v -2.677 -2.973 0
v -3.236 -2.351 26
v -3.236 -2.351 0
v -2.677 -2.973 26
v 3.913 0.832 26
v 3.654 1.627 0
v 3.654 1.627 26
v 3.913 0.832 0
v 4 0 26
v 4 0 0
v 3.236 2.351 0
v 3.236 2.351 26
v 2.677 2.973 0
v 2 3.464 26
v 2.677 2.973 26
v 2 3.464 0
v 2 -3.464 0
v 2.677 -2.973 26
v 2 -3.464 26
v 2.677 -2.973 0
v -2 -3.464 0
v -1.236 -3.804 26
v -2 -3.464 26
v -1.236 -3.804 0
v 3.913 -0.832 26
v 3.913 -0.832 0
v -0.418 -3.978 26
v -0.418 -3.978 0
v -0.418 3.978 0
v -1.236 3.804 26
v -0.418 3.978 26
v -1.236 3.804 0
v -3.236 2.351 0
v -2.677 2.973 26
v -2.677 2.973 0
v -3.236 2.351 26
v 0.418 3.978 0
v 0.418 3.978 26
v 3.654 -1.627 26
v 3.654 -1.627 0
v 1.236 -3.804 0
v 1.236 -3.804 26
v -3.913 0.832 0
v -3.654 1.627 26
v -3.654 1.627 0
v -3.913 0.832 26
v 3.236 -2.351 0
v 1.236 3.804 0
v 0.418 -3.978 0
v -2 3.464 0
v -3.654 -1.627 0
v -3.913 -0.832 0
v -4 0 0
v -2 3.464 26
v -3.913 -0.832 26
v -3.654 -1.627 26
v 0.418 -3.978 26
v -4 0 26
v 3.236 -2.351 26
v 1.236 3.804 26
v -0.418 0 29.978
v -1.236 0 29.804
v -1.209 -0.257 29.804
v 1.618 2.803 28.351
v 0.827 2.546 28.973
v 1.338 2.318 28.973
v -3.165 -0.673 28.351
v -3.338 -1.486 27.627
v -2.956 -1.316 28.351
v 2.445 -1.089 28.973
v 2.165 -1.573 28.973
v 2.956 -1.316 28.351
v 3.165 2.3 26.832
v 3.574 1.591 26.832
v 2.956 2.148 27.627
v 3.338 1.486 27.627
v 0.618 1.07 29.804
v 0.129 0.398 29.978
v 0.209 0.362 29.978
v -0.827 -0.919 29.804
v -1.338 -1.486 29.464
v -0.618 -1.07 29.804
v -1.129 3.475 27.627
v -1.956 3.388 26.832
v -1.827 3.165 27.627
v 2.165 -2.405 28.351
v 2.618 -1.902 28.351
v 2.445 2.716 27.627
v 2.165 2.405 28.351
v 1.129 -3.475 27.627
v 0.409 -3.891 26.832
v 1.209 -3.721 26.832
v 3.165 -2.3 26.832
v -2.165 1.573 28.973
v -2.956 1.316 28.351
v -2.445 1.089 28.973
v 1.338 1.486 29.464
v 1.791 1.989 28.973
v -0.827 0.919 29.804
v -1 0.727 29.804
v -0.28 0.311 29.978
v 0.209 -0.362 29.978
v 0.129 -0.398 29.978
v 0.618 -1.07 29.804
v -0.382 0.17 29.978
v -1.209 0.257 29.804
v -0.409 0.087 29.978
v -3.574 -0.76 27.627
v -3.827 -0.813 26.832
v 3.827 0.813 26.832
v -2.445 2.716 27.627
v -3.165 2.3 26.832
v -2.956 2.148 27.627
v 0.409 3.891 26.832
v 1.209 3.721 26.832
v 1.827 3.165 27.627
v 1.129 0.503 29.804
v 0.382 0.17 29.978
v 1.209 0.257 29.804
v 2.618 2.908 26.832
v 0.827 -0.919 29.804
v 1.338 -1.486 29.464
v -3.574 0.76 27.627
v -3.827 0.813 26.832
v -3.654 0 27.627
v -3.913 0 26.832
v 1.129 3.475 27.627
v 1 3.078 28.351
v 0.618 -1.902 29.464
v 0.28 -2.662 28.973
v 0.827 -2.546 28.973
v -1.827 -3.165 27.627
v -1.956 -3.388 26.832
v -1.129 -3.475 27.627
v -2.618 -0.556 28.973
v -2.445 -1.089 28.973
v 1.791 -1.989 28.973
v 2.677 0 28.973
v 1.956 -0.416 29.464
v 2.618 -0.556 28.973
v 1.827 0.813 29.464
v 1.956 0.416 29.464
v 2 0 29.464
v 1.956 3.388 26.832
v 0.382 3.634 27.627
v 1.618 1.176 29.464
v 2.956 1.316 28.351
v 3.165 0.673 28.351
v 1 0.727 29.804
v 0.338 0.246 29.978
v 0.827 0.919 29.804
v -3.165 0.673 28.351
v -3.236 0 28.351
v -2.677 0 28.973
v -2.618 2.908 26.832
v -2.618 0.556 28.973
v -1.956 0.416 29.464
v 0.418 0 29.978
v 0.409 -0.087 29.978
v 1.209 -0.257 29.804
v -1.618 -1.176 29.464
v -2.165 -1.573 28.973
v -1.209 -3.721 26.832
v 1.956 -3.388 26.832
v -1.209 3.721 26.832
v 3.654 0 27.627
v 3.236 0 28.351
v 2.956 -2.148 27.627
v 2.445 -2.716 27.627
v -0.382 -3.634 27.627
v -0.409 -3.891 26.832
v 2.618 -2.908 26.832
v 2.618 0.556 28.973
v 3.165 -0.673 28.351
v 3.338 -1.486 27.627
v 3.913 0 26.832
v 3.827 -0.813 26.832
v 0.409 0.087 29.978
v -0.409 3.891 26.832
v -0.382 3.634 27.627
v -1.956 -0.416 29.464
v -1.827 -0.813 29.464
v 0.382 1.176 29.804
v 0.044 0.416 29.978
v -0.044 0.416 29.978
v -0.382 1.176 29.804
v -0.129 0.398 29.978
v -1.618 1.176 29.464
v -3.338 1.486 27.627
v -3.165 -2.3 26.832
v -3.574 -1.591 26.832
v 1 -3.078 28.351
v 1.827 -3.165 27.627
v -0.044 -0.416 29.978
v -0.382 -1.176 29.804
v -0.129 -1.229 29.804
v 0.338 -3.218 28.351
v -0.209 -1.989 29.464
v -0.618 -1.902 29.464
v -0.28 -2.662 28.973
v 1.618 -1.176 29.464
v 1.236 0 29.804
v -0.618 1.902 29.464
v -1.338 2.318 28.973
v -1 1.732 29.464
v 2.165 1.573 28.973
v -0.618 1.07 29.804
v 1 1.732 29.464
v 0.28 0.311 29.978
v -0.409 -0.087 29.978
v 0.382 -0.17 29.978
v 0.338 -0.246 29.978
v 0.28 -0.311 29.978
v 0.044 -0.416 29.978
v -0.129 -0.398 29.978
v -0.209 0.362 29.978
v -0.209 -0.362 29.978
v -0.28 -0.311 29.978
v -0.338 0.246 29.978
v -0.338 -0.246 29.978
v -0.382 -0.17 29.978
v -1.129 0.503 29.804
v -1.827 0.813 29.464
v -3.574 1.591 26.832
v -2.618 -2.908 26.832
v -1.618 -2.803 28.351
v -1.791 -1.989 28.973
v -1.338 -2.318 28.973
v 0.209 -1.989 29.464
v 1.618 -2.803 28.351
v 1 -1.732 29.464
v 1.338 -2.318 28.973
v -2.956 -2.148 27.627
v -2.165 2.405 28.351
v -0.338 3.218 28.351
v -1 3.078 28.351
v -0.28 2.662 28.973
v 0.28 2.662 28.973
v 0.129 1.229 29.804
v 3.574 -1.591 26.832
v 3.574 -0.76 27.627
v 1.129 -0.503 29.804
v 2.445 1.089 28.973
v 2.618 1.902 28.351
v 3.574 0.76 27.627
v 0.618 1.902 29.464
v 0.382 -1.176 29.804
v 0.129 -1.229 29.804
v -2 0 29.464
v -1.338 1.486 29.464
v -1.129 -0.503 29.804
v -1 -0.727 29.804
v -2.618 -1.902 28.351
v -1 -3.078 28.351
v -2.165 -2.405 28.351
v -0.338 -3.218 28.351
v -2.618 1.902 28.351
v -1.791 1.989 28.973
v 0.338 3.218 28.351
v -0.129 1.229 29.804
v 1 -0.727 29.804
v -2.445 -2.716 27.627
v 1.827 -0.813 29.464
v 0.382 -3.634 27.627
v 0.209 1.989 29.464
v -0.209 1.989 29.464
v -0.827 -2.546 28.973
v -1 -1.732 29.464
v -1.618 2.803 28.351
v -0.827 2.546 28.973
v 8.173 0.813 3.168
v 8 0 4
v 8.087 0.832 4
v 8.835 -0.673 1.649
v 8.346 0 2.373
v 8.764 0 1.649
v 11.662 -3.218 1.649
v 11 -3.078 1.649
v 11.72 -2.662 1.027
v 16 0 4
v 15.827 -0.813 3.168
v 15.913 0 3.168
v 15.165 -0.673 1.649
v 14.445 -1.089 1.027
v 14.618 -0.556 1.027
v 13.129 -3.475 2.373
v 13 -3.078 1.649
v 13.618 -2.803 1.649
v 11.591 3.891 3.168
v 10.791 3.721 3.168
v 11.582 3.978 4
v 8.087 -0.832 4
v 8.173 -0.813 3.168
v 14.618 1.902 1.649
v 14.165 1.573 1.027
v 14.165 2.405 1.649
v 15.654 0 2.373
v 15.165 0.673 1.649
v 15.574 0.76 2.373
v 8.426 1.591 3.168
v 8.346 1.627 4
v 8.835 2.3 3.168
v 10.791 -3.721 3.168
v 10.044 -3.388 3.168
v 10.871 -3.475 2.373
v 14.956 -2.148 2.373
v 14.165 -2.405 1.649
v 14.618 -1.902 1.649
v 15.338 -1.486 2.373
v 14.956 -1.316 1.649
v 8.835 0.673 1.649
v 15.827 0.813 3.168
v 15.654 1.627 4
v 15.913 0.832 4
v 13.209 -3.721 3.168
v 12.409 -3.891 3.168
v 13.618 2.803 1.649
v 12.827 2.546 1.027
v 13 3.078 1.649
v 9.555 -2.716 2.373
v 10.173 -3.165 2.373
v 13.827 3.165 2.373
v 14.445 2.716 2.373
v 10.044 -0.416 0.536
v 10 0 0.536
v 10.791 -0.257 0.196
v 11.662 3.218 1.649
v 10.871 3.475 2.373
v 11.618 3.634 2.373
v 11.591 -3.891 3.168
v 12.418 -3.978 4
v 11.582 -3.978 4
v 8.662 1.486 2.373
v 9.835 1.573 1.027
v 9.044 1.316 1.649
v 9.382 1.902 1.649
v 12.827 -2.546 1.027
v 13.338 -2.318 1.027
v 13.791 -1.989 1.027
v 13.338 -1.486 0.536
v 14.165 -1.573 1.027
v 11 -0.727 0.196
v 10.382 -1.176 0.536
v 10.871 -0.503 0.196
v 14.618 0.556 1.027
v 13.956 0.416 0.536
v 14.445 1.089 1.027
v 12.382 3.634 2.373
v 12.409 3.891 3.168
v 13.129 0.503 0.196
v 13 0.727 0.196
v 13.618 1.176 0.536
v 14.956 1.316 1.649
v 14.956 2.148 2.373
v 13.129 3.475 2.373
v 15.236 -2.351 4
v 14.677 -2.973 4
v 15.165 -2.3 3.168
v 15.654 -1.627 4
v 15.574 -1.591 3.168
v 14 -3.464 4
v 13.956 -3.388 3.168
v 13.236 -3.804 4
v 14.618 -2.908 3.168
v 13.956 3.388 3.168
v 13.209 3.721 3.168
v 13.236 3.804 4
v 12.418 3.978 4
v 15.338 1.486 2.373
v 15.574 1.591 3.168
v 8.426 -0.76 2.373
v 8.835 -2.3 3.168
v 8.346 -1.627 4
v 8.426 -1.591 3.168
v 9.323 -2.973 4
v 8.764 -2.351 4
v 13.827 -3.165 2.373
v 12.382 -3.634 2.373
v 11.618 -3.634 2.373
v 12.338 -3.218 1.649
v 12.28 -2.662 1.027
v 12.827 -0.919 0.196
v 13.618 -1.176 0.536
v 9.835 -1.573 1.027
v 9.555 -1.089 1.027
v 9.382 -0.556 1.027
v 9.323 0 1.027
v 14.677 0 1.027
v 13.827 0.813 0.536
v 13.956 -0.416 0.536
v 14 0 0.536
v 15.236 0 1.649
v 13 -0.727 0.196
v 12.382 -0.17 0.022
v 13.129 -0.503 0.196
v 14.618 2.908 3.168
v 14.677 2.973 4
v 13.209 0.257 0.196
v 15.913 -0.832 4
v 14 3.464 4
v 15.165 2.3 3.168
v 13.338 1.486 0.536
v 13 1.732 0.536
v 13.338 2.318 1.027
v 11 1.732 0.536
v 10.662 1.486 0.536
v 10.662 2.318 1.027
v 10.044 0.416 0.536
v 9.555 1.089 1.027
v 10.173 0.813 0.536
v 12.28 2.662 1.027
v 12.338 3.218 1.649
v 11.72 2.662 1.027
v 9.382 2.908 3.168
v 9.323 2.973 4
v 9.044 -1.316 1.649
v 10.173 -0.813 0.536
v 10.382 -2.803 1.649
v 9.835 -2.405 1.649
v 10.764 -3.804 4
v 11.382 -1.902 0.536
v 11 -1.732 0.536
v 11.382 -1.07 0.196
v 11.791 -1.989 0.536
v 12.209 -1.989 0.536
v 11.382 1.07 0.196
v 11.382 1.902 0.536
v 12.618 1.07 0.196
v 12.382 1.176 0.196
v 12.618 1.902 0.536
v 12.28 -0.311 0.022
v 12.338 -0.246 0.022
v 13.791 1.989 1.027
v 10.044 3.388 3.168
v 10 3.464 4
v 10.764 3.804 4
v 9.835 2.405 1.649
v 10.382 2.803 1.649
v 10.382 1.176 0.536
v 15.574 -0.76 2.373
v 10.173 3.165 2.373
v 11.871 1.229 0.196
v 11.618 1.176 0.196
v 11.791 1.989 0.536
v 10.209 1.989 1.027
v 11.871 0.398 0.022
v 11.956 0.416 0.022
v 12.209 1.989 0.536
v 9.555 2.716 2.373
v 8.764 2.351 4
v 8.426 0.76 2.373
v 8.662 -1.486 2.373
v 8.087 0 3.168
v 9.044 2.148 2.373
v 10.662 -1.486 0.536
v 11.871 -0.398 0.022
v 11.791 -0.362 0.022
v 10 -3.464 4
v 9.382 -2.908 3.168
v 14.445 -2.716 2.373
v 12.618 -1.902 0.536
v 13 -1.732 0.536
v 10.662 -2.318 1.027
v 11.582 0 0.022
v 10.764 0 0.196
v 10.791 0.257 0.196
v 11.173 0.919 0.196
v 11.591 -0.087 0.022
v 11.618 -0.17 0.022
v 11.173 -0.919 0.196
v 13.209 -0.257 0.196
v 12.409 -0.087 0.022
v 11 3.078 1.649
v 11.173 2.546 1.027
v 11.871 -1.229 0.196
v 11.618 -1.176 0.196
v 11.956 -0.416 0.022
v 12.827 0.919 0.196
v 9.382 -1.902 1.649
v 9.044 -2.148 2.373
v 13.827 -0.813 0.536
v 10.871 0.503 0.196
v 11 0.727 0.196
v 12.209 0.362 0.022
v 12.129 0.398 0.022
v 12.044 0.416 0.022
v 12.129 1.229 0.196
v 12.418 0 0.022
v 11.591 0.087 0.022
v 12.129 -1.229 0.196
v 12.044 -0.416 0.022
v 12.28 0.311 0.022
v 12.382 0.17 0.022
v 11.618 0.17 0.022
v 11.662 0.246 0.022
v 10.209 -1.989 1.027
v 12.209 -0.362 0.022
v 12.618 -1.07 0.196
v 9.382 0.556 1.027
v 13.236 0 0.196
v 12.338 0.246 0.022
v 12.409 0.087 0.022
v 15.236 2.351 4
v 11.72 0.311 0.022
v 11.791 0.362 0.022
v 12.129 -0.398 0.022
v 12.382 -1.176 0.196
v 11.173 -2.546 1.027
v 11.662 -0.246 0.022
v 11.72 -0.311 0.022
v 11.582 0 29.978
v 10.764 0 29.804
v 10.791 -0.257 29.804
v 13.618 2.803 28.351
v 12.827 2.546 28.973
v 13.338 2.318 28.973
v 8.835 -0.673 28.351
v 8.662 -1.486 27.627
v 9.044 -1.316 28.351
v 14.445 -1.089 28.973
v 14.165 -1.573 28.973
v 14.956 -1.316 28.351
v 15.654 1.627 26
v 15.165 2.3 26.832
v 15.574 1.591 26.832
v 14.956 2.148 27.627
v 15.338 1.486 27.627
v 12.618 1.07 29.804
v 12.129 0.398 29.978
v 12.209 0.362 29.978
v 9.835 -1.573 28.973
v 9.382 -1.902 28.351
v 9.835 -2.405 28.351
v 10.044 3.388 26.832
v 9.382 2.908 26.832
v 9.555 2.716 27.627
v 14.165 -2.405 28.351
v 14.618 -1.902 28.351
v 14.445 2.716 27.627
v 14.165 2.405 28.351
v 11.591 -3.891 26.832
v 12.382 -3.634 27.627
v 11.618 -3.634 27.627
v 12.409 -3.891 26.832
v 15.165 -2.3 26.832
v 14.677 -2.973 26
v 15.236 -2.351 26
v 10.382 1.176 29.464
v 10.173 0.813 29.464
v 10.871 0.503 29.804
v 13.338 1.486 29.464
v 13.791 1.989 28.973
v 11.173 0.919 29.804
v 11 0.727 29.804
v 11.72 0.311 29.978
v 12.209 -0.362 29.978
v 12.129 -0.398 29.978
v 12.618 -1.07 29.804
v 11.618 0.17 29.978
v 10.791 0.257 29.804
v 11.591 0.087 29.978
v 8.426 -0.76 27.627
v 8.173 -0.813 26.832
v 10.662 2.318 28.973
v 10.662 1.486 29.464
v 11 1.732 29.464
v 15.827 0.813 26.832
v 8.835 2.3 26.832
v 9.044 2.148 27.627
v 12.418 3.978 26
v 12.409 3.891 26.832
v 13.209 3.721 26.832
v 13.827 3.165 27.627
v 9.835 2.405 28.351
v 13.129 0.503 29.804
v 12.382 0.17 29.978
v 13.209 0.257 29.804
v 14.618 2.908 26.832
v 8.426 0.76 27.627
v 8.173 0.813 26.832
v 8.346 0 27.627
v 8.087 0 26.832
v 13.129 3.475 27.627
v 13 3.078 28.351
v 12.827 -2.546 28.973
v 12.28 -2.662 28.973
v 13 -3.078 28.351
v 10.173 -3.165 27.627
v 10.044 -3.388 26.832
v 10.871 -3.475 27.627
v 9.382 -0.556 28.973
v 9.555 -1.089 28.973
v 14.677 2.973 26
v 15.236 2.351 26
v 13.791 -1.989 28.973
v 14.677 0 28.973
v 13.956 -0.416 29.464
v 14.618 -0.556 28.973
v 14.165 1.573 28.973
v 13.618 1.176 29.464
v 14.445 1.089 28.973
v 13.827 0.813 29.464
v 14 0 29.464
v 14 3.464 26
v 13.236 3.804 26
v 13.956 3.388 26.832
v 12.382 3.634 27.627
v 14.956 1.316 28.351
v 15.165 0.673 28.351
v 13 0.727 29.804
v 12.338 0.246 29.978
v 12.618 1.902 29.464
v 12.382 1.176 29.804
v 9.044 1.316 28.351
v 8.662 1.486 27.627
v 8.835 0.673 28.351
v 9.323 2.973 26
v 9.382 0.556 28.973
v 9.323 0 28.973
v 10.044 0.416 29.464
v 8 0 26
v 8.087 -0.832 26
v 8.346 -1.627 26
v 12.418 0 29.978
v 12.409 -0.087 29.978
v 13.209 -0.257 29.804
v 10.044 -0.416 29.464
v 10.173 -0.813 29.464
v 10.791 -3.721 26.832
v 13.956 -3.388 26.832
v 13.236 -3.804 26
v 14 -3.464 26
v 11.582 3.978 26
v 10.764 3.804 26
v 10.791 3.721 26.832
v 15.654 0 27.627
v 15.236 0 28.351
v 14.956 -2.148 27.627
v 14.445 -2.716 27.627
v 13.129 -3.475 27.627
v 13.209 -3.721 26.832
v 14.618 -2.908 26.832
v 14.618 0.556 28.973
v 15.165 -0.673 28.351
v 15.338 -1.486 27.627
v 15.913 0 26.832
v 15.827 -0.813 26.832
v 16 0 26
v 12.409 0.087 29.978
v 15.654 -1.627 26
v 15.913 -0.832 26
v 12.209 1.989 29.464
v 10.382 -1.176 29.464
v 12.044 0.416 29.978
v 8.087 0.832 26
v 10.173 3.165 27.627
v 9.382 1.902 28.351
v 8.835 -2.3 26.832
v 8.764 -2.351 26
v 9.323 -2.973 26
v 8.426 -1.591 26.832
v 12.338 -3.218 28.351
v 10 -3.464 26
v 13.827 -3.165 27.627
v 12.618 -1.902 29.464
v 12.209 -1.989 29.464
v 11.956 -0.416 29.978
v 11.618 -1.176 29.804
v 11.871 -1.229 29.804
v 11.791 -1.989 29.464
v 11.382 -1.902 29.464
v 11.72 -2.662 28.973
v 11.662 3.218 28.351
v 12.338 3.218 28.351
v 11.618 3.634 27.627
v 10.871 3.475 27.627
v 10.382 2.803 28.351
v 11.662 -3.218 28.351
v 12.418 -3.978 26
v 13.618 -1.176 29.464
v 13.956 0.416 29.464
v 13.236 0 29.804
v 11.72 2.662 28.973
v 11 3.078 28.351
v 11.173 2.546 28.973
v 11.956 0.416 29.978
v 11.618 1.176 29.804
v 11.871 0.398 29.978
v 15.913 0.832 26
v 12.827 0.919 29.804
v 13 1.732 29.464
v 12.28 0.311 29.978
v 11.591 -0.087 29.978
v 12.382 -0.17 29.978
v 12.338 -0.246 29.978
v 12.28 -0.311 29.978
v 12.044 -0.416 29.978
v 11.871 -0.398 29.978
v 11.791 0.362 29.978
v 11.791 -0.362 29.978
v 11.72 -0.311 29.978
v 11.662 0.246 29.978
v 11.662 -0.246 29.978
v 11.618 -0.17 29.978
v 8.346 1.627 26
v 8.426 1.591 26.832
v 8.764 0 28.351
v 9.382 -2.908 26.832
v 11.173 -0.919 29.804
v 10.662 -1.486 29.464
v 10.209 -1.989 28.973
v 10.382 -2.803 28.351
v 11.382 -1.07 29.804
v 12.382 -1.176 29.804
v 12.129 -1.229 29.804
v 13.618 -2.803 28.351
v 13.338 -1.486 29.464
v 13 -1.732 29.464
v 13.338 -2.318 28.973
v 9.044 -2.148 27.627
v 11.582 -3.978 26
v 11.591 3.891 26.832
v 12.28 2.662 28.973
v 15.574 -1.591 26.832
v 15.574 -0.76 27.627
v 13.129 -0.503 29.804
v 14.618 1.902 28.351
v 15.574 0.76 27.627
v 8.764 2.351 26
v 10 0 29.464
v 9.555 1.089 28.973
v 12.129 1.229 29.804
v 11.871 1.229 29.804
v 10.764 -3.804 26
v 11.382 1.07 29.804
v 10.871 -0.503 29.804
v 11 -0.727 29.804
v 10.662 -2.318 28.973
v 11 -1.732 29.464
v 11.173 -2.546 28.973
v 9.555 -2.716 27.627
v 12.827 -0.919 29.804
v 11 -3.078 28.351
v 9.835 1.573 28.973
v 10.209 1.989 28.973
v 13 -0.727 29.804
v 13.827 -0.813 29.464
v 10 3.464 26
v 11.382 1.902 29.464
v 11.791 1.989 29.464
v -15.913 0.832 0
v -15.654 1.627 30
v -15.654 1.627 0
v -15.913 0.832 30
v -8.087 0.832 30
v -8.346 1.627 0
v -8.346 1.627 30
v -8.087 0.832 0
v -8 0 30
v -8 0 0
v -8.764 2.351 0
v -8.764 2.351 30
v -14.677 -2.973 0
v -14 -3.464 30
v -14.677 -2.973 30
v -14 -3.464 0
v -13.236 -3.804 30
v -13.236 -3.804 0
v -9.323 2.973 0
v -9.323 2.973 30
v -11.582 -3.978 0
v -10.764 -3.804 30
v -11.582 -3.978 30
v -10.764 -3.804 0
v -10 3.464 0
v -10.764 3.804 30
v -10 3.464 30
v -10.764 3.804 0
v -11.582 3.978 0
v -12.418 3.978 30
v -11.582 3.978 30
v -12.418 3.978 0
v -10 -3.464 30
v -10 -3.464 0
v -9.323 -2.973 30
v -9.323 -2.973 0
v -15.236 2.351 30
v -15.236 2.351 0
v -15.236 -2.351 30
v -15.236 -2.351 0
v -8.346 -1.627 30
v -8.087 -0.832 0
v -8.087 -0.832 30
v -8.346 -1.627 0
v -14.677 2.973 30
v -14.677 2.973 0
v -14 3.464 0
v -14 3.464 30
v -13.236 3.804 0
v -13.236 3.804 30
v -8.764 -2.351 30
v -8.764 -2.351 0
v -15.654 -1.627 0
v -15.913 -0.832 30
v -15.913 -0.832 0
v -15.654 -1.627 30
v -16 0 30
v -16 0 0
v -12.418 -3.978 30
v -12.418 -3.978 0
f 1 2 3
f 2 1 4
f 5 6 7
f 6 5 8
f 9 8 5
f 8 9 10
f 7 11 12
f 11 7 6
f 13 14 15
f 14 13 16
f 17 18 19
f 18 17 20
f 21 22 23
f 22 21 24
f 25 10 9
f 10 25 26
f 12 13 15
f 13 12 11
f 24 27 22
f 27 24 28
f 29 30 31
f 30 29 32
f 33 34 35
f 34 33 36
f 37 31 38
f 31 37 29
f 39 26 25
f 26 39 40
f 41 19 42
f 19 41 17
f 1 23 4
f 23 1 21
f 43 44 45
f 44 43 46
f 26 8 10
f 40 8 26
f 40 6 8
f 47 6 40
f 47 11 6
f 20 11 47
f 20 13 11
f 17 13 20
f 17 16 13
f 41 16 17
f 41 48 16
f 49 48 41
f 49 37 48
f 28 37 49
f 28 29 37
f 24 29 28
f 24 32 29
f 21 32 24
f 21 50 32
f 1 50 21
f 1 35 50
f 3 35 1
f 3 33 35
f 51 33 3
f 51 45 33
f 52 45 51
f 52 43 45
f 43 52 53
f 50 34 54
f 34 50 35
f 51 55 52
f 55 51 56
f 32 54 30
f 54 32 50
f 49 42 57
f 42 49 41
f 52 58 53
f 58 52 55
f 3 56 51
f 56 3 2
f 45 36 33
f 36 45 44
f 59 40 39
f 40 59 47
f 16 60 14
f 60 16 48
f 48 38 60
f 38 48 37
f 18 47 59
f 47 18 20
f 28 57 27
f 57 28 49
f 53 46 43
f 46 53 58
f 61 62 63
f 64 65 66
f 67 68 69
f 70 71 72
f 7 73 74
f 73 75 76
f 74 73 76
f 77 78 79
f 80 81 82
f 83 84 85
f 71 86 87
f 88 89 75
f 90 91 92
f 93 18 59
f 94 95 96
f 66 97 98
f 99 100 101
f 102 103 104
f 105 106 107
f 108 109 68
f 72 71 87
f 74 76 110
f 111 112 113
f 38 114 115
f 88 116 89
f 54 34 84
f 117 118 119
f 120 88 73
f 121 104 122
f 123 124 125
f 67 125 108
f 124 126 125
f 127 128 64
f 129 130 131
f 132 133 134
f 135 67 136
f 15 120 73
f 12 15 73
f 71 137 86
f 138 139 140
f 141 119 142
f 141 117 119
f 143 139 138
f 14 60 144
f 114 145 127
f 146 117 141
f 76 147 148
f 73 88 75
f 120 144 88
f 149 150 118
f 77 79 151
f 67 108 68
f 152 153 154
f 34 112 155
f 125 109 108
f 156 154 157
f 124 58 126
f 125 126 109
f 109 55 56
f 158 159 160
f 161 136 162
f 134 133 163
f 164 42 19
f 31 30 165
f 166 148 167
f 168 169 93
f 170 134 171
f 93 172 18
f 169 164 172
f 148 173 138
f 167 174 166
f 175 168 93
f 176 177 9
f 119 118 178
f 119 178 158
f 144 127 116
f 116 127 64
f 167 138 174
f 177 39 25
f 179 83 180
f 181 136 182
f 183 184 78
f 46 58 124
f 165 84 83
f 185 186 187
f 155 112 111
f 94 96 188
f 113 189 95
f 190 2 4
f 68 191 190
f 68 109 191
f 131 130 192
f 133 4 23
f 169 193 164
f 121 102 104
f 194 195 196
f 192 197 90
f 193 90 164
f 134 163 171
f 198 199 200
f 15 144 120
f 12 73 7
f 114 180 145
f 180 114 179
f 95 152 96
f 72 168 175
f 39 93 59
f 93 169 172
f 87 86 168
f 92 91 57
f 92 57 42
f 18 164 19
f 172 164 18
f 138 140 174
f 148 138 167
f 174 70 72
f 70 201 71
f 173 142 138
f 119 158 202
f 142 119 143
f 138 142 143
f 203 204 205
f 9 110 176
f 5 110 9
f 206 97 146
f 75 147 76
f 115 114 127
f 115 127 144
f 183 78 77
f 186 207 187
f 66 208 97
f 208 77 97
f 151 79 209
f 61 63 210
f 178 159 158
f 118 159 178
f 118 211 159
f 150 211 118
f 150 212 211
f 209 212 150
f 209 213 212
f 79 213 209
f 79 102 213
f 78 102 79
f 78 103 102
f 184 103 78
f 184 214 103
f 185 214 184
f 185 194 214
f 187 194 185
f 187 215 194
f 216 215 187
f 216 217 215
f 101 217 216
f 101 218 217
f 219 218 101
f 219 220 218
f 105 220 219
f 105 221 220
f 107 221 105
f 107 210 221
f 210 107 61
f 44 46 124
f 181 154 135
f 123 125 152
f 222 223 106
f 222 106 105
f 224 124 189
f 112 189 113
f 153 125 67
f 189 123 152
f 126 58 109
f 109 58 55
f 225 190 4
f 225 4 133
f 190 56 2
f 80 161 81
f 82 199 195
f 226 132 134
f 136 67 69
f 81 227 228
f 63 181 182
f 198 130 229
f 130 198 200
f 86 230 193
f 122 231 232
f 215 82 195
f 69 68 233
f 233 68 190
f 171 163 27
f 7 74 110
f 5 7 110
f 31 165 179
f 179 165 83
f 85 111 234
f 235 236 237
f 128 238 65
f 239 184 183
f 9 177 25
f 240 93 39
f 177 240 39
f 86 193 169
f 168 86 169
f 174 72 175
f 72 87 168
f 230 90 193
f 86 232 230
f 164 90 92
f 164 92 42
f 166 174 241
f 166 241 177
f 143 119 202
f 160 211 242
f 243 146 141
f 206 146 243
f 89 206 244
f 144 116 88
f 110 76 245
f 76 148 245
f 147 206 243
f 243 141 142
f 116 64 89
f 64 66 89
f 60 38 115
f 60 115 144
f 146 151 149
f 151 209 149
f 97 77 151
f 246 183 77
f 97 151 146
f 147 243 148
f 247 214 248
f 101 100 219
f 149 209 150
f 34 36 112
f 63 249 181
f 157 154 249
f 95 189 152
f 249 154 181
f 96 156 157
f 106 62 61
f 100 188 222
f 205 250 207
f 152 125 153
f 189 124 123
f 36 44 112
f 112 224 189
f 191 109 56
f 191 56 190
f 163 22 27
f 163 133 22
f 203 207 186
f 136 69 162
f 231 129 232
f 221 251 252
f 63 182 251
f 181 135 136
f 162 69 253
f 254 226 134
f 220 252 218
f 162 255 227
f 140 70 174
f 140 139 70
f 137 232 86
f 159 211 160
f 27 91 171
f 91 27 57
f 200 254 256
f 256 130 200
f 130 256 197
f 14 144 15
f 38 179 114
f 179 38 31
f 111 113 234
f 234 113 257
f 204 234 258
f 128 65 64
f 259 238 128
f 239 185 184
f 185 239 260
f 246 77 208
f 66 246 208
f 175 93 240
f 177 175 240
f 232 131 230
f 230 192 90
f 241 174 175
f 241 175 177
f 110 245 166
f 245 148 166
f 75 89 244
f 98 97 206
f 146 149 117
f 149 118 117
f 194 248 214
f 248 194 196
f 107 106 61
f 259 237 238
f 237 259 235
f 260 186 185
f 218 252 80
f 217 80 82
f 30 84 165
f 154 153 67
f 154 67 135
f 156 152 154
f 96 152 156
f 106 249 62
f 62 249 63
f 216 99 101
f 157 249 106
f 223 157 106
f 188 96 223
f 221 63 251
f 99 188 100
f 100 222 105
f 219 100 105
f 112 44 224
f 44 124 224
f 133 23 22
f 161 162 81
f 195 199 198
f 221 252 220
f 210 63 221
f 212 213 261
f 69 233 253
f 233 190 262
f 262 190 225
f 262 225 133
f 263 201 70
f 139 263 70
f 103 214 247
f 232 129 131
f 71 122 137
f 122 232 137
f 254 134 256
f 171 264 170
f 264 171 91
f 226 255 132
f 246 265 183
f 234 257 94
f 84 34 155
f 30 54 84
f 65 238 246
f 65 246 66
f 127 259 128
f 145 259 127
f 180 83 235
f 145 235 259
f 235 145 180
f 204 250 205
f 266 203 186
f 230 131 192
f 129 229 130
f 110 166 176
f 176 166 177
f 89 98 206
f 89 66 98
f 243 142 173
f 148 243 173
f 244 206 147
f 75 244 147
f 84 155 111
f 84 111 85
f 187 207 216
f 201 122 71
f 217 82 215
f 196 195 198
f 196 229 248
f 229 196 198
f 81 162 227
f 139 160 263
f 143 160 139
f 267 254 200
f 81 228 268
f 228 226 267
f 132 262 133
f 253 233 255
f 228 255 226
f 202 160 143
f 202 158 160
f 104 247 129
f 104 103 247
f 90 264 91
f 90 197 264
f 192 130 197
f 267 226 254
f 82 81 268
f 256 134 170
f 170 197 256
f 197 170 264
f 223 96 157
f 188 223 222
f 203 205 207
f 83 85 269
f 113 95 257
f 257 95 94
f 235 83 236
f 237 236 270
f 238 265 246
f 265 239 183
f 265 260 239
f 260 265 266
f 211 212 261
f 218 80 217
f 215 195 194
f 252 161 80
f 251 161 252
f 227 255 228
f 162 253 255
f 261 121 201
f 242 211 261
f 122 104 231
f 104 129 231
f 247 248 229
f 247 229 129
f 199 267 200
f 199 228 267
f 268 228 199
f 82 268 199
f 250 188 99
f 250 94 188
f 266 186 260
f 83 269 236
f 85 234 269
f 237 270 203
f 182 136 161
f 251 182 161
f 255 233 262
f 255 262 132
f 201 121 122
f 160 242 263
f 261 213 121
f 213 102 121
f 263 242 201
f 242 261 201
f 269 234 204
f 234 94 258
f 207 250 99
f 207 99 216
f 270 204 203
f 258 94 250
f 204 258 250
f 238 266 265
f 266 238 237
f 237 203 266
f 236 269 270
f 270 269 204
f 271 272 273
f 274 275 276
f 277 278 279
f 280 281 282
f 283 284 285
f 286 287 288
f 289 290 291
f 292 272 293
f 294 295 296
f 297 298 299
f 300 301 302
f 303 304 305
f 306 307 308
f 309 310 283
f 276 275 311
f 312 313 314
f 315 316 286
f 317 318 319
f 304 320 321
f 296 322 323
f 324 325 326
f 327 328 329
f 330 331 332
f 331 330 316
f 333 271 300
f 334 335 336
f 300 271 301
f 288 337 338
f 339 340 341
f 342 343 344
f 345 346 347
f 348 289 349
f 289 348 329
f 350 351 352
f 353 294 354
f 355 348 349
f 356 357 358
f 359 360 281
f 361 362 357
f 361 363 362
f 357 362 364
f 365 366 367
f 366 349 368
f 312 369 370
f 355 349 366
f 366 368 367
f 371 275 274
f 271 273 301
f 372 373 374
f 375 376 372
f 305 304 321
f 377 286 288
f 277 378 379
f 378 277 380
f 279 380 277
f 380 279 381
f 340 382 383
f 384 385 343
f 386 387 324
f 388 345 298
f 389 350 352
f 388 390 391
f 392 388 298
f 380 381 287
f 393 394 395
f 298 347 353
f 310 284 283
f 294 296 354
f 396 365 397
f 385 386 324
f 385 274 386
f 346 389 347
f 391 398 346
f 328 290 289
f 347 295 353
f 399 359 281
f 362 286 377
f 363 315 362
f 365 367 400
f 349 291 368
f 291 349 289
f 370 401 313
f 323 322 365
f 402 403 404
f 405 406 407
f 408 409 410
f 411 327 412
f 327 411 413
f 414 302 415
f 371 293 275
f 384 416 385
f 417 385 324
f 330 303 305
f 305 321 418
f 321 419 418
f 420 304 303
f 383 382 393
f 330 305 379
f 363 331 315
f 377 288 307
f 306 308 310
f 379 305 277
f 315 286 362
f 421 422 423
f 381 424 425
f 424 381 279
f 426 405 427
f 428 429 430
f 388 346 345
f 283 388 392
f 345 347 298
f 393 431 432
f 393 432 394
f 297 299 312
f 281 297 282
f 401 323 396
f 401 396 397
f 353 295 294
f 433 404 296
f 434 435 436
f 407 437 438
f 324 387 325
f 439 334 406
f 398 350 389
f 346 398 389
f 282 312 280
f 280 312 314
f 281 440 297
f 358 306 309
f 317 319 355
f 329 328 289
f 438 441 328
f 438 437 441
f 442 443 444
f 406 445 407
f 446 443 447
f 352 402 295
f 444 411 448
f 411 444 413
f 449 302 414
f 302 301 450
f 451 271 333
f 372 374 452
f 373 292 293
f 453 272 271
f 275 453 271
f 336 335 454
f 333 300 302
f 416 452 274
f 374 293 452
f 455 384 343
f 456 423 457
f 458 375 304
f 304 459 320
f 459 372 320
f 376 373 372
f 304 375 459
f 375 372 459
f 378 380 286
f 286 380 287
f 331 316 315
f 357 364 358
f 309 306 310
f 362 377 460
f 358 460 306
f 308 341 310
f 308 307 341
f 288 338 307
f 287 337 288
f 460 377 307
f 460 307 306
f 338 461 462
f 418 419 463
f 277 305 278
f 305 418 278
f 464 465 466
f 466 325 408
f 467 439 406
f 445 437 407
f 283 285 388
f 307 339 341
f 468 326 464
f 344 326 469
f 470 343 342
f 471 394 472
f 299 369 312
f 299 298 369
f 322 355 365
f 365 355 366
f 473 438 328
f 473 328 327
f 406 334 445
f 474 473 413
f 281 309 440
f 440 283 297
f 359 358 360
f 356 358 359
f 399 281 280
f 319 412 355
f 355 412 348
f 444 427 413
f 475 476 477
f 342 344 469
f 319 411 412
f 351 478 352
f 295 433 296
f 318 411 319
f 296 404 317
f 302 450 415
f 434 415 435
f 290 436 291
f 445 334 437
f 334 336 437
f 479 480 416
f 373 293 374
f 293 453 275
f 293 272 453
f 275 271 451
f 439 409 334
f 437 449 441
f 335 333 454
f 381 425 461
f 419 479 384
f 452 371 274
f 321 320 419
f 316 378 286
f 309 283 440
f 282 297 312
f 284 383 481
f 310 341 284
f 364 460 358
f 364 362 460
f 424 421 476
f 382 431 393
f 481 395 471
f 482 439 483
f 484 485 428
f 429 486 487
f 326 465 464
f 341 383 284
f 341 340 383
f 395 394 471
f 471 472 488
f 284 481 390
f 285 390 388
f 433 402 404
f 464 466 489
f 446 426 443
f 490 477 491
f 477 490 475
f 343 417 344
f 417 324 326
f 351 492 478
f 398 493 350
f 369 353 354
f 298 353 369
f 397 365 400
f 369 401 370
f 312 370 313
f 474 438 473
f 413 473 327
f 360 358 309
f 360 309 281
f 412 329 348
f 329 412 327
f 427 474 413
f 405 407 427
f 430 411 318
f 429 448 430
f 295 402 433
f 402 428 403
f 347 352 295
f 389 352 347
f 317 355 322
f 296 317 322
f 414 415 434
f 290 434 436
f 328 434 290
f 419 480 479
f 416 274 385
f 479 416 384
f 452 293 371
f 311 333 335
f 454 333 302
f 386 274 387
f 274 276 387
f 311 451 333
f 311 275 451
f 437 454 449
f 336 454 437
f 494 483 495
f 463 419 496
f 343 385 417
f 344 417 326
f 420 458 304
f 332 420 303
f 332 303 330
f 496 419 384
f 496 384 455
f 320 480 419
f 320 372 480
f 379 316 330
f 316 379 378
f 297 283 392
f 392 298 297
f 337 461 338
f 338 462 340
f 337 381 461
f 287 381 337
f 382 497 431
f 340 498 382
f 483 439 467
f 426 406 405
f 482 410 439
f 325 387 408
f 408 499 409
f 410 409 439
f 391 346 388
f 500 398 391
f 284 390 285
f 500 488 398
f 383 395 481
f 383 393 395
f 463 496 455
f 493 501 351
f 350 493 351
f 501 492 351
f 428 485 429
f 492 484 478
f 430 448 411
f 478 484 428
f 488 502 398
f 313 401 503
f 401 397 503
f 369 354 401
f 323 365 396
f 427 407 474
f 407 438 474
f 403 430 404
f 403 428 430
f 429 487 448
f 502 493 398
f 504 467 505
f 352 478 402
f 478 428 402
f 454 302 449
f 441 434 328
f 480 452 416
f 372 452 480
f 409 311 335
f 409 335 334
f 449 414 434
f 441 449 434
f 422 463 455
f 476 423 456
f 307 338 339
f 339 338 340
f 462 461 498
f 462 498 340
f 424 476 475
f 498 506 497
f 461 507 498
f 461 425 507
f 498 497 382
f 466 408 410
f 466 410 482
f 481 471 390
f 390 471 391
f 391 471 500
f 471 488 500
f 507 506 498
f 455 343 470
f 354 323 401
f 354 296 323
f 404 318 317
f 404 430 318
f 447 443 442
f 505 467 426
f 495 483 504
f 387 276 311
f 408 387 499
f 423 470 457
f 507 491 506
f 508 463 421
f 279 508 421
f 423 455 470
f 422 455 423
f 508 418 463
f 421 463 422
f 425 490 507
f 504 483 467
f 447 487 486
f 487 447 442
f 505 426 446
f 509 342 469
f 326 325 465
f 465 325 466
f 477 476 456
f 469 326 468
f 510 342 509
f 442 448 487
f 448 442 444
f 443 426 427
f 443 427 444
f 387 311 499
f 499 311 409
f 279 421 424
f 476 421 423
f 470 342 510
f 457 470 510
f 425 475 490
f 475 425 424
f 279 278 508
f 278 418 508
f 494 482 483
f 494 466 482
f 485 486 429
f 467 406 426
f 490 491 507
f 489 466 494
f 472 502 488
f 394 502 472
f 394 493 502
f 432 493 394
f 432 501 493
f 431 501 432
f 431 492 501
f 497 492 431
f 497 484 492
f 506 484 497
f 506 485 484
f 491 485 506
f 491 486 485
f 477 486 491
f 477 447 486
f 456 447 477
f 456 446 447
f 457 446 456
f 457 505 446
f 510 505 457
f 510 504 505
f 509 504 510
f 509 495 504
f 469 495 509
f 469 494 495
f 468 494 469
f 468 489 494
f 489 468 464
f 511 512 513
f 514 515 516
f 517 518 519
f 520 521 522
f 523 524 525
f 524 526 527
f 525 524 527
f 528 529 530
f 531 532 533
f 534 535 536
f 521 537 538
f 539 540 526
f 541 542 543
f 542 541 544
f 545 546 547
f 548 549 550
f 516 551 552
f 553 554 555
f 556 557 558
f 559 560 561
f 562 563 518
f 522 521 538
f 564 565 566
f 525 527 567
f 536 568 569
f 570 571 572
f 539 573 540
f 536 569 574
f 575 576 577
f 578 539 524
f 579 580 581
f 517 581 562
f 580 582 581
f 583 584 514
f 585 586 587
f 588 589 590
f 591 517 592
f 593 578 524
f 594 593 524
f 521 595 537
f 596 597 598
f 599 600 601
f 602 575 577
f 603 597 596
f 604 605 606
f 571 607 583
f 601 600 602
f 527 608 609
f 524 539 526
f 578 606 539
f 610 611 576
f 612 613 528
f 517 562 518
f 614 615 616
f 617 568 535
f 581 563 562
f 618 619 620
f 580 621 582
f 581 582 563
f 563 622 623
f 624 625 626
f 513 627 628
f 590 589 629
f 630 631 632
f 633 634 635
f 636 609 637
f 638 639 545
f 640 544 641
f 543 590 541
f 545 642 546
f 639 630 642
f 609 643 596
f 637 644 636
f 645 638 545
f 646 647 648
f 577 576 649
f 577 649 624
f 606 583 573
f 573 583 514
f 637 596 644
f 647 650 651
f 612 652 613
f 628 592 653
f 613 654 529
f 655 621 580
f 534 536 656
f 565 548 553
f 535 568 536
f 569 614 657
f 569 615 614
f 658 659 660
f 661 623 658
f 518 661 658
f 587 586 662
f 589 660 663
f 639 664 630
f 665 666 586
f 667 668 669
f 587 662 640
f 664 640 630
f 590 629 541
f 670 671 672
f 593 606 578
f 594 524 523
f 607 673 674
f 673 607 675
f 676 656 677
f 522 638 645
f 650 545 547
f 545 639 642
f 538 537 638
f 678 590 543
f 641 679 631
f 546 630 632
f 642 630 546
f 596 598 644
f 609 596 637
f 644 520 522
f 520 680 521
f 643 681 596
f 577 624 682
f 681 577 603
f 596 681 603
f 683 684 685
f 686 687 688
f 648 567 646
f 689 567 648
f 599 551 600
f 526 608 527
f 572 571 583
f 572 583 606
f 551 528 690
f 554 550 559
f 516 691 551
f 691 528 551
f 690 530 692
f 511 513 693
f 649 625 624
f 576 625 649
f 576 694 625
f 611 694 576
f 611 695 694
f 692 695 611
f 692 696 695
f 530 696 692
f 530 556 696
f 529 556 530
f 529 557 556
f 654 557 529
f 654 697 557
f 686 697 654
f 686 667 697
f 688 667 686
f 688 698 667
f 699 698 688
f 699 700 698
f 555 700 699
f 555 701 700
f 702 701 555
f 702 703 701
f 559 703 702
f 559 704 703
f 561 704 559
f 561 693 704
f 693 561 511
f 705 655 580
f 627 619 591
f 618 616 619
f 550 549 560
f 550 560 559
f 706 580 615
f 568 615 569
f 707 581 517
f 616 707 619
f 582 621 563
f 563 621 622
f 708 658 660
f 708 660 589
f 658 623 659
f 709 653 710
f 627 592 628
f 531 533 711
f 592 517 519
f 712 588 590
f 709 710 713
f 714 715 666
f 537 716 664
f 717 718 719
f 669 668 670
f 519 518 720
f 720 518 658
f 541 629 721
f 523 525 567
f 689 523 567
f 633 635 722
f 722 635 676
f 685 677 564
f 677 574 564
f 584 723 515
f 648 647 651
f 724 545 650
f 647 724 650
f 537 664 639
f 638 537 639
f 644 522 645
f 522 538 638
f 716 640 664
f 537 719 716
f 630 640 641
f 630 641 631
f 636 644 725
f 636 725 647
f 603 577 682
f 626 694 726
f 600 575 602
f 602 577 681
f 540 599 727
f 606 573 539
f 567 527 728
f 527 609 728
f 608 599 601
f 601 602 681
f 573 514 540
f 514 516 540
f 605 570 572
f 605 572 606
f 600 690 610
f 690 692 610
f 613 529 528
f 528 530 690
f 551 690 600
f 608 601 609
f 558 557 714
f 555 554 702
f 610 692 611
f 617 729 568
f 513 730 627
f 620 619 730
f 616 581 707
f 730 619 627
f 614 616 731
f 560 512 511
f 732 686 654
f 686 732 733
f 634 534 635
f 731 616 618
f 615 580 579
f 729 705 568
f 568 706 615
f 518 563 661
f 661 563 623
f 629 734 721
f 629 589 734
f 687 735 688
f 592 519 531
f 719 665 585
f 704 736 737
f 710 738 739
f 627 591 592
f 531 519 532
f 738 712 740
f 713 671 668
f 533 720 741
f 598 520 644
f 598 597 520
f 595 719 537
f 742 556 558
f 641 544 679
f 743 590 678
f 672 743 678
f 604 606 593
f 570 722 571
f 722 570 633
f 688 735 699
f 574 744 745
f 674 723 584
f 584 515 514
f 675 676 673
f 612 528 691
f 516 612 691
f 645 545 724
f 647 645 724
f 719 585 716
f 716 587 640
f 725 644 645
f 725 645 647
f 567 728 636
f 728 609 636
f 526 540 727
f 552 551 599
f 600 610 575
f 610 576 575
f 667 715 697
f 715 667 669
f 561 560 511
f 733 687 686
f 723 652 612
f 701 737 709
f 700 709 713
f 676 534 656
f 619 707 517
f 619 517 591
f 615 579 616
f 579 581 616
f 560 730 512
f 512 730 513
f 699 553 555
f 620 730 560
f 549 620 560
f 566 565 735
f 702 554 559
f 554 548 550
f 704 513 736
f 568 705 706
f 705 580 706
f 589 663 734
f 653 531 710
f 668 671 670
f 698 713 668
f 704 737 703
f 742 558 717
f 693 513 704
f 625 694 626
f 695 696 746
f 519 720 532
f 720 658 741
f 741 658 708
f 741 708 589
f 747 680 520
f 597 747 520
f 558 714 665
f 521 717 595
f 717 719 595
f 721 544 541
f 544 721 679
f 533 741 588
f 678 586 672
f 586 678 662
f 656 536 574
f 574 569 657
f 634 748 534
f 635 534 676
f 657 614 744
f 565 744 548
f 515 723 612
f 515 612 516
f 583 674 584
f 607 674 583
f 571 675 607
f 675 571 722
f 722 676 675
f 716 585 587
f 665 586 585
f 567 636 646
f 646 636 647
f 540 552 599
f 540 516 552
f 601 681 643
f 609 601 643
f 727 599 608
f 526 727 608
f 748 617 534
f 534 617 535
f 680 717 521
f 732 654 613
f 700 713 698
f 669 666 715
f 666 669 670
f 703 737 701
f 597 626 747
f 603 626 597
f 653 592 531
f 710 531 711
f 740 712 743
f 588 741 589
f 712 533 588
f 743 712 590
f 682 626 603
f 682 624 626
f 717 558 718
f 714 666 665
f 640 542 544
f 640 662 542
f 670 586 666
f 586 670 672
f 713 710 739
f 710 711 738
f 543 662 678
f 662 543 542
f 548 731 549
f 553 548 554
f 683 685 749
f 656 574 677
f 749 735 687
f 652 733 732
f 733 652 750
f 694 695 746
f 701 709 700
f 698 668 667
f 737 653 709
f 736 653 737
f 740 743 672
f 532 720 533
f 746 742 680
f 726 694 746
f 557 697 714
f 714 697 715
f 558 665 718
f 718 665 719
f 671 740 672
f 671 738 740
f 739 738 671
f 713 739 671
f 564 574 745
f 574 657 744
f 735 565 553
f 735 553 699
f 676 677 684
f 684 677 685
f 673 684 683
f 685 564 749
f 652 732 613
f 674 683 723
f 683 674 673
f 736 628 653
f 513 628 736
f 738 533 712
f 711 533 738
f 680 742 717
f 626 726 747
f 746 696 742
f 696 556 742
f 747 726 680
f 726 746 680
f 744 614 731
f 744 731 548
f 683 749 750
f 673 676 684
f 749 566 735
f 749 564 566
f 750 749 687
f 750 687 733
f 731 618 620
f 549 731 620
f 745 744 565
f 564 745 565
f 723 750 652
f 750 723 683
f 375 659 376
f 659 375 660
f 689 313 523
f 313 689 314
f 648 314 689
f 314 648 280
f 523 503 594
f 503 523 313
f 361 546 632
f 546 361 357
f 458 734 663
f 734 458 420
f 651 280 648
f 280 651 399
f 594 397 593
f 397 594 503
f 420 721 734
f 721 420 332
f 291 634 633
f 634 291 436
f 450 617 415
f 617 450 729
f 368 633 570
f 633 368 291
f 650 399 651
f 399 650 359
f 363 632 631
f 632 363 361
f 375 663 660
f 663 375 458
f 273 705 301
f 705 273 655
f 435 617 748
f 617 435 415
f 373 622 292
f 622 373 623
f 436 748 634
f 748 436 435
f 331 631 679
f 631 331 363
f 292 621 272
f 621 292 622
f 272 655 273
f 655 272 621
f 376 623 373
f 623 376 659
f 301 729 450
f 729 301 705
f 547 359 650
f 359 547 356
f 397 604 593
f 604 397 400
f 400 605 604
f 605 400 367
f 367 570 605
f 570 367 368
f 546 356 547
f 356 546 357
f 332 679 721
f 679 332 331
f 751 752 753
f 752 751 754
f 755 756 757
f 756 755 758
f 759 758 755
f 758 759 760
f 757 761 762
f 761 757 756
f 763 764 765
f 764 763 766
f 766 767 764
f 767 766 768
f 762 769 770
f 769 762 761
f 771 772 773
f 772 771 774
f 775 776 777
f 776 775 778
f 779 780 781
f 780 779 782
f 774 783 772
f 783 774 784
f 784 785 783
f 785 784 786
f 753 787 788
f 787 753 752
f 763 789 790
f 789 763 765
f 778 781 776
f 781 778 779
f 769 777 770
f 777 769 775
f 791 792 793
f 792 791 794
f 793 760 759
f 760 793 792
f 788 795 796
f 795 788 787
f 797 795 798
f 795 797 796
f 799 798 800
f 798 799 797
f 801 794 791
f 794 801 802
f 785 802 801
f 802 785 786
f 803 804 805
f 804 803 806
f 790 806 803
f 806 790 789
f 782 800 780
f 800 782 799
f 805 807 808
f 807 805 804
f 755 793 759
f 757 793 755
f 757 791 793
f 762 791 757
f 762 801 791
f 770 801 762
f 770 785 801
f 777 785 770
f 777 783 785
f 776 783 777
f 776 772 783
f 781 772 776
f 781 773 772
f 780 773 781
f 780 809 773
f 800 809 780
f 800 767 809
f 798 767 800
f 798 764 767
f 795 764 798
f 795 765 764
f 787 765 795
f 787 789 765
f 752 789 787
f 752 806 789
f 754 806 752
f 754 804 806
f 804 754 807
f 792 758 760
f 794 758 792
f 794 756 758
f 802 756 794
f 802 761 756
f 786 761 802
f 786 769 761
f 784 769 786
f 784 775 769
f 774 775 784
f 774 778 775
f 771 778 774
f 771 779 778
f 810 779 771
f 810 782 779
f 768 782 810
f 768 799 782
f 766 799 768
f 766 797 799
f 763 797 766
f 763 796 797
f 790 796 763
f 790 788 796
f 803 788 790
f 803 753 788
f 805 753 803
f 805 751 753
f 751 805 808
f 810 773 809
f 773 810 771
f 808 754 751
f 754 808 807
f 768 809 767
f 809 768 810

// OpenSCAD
module rcylinder(r=4, h=20,center=false,both=false,$fn=30)
{
  hc = (both==true) ? h-2*r:h-r;
  posC = (center==true)?0:h/2;
  
  translate([0,0,posC]){
      if(both==true){
          cylinder(r=r,h=hc, center=true,$fn=$fn);
          for(i=[-1:1])
            translate([0,0,i*hc/2])
                sphere(r=r,$fn=$fn);
      }else{
          translate([0,0,-h/2]){
            cylinder(r=r,h=hc,$fn=$fn); 
              translate([0,0,hc])
                sphere(r=r,$fn=$fn);
          }
      }  
  }
}

//-- Parametros para los ejemplos
r=4;
h=30;
center=false;
$fn=30;

//-------- Objetos ejemplo------

//-- Cilindro normal
translate([-3*r,0,0])
    cylinder(r=r,h=h,both=false, center=center,$fn=$fn);

//-- Cilindro con tapa superior redondeada
rcylinder(r=r,h=h,both=false,center=center,$fn=$fn);

//-- Cilindro con ambas tapas redondeadas
translate([3*r,0,0])
    rcylinder(r=r,h=h,both=true,center=center,$fn=$fn);
